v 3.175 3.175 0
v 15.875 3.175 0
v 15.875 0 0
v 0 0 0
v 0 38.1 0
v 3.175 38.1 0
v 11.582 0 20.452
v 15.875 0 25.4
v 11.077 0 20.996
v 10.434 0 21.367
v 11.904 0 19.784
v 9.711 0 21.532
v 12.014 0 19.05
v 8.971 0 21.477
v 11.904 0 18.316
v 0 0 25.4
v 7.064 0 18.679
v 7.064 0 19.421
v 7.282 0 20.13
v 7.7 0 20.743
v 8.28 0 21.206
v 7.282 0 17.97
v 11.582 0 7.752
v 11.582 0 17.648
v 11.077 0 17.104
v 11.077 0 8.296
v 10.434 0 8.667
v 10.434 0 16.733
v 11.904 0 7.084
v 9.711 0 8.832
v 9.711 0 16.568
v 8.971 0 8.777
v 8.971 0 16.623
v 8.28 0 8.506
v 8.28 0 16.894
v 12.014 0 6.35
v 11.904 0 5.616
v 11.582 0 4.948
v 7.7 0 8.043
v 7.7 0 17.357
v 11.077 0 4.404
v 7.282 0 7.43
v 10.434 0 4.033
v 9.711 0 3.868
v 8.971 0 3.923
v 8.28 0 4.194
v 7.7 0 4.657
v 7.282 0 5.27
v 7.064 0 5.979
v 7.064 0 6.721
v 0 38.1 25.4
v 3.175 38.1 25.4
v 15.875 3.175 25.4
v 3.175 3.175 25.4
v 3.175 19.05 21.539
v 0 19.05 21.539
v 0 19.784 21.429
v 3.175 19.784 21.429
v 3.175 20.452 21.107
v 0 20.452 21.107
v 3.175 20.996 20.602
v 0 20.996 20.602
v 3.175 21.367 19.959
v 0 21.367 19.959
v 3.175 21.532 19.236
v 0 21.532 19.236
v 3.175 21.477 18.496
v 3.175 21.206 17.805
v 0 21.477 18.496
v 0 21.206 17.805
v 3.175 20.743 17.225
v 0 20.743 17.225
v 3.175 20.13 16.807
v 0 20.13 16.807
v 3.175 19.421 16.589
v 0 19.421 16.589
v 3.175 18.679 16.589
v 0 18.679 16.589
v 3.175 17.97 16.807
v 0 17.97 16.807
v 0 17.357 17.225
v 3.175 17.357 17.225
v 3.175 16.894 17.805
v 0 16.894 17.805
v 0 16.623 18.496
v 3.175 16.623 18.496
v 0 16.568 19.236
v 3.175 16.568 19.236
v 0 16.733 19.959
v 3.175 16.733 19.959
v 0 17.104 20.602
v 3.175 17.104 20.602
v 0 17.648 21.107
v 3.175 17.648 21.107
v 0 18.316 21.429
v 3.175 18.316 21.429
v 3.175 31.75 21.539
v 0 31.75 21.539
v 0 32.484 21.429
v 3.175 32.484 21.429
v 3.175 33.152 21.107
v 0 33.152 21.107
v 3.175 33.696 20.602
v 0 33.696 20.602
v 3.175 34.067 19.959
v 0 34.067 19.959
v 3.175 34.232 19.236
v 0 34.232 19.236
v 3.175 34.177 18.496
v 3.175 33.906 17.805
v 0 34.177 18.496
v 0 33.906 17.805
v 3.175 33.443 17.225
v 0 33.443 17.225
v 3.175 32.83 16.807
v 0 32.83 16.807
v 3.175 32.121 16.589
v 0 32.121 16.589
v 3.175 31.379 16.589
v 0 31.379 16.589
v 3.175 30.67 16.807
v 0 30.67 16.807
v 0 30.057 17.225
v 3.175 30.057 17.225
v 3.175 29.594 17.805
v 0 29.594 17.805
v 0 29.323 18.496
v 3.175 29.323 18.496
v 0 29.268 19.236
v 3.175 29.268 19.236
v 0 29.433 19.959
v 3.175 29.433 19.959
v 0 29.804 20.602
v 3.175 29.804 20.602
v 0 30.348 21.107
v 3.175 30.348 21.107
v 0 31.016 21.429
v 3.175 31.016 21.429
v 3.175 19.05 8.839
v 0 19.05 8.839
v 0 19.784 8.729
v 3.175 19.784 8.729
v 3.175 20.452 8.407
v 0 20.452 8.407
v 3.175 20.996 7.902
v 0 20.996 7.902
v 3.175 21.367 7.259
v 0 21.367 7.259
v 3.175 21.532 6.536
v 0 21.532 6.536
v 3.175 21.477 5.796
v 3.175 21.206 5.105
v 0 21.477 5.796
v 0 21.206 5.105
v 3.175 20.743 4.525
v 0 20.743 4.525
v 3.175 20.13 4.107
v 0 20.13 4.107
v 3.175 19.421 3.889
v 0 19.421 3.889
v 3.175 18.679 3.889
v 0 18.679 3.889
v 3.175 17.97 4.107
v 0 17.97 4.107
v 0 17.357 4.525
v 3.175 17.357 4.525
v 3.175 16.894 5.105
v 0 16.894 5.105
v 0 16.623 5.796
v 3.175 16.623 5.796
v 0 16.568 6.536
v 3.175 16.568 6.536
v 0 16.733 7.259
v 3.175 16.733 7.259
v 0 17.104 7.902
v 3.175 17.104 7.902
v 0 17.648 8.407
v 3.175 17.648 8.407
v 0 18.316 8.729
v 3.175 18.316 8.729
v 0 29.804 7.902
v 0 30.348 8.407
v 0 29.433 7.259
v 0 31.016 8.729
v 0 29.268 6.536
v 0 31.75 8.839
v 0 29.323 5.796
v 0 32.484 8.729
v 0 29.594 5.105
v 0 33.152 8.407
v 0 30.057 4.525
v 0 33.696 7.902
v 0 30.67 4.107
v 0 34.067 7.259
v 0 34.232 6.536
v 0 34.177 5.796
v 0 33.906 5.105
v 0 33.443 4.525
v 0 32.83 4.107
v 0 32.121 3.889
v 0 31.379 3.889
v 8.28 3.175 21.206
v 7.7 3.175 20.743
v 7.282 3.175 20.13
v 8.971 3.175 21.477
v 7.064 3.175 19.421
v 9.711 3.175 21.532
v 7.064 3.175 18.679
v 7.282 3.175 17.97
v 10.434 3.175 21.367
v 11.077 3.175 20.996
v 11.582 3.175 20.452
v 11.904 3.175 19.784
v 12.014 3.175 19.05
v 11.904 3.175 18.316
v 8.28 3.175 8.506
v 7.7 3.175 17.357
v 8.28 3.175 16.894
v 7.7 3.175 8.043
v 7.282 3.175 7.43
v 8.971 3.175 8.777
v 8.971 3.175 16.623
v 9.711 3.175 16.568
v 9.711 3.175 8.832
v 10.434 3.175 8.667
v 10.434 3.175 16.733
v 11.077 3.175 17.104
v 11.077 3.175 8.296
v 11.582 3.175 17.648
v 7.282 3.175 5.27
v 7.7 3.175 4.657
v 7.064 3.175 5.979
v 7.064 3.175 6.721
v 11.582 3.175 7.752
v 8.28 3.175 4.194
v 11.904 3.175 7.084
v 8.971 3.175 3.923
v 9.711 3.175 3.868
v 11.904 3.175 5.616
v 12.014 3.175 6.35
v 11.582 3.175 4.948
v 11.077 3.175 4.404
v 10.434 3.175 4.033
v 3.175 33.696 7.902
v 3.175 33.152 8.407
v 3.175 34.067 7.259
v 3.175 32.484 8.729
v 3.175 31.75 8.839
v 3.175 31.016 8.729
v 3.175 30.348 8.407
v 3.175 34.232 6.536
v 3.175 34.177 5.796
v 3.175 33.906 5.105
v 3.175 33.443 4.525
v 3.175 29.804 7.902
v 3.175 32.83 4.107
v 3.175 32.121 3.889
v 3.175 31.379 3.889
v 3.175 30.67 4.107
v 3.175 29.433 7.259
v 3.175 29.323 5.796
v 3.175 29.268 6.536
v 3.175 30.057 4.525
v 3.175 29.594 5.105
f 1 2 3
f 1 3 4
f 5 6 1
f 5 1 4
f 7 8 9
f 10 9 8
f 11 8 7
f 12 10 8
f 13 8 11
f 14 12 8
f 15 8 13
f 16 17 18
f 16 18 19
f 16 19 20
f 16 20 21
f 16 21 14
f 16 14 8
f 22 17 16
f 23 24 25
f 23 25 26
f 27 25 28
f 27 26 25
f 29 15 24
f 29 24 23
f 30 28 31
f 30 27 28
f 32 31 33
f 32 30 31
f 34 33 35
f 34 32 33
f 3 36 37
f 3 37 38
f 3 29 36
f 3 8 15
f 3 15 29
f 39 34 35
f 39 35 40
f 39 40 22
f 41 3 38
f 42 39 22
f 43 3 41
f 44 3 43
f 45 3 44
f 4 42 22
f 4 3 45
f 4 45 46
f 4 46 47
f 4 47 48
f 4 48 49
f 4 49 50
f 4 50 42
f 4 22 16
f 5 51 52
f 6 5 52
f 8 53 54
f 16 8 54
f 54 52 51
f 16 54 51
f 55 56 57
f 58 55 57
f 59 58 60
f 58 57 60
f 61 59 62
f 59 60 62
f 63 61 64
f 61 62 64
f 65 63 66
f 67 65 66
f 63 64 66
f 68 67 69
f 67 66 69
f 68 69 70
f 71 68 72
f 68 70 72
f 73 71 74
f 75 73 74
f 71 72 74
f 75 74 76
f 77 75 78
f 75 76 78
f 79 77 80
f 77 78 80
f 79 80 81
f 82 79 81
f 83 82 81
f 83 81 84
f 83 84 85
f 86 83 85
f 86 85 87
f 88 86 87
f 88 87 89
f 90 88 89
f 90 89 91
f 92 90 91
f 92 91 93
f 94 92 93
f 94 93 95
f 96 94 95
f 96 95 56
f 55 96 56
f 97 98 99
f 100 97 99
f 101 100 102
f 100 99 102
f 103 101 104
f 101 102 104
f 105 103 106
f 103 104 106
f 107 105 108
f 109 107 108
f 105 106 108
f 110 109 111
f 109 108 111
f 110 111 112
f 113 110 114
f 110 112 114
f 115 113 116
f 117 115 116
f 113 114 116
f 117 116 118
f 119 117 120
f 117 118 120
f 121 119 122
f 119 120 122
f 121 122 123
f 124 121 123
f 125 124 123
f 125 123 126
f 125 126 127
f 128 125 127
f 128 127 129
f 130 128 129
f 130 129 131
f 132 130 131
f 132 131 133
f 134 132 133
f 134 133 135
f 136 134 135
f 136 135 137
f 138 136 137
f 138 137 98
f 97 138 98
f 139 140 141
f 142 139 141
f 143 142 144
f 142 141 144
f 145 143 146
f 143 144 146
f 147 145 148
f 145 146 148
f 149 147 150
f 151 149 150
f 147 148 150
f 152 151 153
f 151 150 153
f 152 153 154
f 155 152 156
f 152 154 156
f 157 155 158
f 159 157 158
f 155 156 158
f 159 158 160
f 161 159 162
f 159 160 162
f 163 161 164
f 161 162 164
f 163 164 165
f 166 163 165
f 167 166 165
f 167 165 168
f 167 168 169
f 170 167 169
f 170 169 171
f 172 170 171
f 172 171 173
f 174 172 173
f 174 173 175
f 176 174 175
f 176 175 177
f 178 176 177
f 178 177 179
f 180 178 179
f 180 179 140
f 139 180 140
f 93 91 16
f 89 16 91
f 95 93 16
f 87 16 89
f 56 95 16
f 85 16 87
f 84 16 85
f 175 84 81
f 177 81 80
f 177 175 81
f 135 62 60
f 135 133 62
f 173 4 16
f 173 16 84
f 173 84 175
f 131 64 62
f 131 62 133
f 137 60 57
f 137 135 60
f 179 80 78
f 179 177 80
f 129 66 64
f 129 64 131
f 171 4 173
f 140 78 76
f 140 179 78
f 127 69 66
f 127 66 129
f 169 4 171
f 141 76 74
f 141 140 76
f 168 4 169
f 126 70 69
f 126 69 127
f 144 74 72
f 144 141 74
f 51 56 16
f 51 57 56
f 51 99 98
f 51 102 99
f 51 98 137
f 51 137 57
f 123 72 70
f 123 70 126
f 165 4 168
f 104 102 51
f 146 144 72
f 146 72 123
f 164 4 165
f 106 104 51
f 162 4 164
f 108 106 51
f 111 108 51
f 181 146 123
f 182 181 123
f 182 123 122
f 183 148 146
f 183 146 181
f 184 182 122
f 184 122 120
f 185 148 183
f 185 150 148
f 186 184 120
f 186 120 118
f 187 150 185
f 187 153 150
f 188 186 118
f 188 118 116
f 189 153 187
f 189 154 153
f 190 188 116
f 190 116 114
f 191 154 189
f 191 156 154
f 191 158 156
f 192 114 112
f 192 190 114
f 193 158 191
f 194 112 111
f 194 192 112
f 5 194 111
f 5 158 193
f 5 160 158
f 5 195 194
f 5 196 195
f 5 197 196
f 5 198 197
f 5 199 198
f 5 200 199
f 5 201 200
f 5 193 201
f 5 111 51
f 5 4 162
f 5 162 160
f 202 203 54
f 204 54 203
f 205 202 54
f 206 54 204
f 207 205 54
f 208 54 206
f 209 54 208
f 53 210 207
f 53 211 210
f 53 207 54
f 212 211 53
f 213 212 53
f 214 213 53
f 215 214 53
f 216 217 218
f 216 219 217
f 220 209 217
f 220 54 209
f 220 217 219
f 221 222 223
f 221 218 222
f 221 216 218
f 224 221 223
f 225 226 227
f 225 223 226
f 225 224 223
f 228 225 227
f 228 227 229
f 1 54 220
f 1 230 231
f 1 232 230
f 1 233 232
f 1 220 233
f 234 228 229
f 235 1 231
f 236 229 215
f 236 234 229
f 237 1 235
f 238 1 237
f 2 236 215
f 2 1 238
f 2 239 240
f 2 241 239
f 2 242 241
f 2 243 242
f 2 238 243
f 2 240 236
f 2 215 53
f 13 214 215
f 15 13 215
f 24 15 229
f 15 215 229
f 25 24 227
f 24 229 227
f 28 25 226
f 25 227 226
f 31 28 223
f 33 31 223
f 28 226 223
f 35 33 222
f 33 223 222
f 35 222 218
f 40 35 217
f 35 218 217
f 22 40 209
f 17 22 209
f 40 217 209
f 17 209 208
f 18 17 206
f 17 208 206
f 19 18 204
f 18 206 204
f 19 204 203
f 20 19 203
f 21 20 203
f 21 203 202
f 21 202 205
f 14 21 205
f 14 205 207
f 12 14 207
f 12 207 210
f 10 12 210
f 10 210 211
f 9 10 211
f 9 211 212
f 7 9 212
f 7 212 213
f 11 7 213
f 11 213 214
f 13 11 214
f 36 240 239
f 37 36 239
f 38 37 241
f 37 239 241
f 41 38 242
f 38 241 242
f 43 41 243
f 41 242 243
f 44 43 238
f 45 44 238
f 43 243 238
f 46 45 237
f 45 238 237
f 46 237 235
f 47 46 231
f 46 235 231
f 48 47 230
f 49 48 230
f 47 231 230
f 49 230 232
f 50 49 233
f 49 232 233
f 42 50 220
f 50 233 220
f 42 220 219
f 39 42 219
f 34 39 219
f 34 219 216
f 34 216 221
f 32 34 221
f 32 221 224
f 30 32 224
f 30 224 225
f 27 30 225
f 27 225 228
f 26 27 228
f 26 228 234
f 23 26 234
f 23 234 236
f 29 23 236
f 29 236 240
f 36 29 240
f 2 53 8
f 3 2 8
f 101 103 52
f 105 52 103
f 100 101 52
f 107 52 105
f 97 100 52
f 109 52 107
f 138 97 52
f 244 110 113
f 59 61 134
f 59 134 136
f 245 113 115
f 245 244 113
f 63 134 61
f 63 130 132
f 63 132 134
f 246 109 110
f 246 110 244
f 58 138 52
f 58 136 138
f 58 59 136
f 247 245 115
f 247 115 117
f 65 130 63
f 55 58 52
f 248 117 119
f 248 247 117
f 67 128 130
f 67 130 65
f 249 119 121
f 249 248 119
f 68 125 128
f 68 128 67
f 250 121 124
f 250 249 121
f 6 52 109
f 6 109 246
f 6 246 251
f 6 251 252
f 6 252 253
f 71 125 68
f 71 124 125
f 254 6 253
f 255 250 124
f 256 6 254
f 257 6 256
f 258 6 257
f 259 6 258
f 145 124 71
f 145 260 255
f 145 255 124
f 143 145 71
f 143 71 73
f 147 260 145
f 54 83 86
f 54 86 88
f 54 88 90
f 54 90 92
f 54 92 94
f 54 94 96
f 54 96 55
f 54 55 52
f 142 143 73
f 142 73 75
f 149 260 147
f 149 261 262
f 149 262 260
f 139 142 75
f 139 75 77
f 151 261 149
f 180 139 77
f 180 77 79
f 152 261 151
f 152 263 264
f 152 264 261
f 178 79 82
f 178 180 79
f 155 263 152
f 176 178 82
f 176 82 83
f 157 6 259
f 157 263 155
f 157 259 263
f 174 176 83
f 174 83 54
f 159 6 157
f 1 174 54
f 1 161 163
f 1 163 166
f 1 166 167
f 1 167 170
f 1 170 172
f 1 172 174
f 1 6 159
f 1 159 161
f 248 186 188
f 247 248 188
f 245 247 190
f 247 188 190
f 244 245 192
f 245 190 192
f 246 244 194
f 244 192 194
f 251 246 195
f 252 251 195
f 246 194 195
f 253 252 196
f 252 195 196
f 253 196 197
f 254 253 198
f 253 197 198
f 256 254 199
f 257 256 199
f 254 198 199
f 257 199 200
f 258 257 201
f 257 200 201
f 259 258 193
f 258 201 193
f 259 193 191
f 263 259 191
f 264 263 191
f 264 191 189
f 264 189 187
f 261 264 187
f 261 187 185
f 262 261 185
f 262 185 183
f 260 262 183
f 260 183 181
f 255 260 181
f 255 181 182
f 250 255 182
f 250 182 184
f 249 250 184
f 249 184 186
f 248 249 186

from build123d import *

# Parameters (mm, degrees)
BOSS_EXTRUDE1_DEPTH = 25.4
SKETCH2_R           = 2.4892
CUT_EXTRUDE1_DEPTH  = 4.175
SKETCH4_R           = 2.4892
CUT_EXTRUDE2_DEPTH  = 16.875


with BuildPart() as part:
    # Sketch1 → Boss-Extrude1 (new body)
    with BuildSketch(Plane.XY):
        Polygon((0, 0), (0, 38.1), (3.175, 38.1), (3.175, 3.175), (15.875, 3.175), (15.875, 0), align=None)
    extrude(amount=BOSS_EXTRUDE1_DEPTH)

    # Sketch2 → Cut-Extrude1 (cut, through all)
    with BuildSketch(Plane(origin=(0, 3.175, 0), x_dir=(1, 0, 0), z_dir=(0, 1, 0))):
        with Locations((9.525, -6.35)):
            Circle(SKETCH2_R)
        with Locations((9.525, -19.05)):
            Circle(SKETCH2_R)
    extrude(amount=-CUT_EXTRUDE1_DEPTH, mode=Mode.SUBTRACT)

    # Sketch4 → Cut-Extrude2 (cut, through all)
    with BuildSketch(Plane.ZY):
        with Locations((6.35, 31.75)):
            Circle(SKETCH4_R)
        with Locations((19.05, 31.75)):
            Circle(SKETCH4_R)
        with Locations((19.05, 19.05)):
            Circle(SKETCH4_R)
        with Locations((6.35, 19.05)):
            Circle(SKETCH4_R)
    extrude(amount=-CUT_EXTRUDE2_DEPTH, mode=Mode.SUBTRACT)


solid = part.part
